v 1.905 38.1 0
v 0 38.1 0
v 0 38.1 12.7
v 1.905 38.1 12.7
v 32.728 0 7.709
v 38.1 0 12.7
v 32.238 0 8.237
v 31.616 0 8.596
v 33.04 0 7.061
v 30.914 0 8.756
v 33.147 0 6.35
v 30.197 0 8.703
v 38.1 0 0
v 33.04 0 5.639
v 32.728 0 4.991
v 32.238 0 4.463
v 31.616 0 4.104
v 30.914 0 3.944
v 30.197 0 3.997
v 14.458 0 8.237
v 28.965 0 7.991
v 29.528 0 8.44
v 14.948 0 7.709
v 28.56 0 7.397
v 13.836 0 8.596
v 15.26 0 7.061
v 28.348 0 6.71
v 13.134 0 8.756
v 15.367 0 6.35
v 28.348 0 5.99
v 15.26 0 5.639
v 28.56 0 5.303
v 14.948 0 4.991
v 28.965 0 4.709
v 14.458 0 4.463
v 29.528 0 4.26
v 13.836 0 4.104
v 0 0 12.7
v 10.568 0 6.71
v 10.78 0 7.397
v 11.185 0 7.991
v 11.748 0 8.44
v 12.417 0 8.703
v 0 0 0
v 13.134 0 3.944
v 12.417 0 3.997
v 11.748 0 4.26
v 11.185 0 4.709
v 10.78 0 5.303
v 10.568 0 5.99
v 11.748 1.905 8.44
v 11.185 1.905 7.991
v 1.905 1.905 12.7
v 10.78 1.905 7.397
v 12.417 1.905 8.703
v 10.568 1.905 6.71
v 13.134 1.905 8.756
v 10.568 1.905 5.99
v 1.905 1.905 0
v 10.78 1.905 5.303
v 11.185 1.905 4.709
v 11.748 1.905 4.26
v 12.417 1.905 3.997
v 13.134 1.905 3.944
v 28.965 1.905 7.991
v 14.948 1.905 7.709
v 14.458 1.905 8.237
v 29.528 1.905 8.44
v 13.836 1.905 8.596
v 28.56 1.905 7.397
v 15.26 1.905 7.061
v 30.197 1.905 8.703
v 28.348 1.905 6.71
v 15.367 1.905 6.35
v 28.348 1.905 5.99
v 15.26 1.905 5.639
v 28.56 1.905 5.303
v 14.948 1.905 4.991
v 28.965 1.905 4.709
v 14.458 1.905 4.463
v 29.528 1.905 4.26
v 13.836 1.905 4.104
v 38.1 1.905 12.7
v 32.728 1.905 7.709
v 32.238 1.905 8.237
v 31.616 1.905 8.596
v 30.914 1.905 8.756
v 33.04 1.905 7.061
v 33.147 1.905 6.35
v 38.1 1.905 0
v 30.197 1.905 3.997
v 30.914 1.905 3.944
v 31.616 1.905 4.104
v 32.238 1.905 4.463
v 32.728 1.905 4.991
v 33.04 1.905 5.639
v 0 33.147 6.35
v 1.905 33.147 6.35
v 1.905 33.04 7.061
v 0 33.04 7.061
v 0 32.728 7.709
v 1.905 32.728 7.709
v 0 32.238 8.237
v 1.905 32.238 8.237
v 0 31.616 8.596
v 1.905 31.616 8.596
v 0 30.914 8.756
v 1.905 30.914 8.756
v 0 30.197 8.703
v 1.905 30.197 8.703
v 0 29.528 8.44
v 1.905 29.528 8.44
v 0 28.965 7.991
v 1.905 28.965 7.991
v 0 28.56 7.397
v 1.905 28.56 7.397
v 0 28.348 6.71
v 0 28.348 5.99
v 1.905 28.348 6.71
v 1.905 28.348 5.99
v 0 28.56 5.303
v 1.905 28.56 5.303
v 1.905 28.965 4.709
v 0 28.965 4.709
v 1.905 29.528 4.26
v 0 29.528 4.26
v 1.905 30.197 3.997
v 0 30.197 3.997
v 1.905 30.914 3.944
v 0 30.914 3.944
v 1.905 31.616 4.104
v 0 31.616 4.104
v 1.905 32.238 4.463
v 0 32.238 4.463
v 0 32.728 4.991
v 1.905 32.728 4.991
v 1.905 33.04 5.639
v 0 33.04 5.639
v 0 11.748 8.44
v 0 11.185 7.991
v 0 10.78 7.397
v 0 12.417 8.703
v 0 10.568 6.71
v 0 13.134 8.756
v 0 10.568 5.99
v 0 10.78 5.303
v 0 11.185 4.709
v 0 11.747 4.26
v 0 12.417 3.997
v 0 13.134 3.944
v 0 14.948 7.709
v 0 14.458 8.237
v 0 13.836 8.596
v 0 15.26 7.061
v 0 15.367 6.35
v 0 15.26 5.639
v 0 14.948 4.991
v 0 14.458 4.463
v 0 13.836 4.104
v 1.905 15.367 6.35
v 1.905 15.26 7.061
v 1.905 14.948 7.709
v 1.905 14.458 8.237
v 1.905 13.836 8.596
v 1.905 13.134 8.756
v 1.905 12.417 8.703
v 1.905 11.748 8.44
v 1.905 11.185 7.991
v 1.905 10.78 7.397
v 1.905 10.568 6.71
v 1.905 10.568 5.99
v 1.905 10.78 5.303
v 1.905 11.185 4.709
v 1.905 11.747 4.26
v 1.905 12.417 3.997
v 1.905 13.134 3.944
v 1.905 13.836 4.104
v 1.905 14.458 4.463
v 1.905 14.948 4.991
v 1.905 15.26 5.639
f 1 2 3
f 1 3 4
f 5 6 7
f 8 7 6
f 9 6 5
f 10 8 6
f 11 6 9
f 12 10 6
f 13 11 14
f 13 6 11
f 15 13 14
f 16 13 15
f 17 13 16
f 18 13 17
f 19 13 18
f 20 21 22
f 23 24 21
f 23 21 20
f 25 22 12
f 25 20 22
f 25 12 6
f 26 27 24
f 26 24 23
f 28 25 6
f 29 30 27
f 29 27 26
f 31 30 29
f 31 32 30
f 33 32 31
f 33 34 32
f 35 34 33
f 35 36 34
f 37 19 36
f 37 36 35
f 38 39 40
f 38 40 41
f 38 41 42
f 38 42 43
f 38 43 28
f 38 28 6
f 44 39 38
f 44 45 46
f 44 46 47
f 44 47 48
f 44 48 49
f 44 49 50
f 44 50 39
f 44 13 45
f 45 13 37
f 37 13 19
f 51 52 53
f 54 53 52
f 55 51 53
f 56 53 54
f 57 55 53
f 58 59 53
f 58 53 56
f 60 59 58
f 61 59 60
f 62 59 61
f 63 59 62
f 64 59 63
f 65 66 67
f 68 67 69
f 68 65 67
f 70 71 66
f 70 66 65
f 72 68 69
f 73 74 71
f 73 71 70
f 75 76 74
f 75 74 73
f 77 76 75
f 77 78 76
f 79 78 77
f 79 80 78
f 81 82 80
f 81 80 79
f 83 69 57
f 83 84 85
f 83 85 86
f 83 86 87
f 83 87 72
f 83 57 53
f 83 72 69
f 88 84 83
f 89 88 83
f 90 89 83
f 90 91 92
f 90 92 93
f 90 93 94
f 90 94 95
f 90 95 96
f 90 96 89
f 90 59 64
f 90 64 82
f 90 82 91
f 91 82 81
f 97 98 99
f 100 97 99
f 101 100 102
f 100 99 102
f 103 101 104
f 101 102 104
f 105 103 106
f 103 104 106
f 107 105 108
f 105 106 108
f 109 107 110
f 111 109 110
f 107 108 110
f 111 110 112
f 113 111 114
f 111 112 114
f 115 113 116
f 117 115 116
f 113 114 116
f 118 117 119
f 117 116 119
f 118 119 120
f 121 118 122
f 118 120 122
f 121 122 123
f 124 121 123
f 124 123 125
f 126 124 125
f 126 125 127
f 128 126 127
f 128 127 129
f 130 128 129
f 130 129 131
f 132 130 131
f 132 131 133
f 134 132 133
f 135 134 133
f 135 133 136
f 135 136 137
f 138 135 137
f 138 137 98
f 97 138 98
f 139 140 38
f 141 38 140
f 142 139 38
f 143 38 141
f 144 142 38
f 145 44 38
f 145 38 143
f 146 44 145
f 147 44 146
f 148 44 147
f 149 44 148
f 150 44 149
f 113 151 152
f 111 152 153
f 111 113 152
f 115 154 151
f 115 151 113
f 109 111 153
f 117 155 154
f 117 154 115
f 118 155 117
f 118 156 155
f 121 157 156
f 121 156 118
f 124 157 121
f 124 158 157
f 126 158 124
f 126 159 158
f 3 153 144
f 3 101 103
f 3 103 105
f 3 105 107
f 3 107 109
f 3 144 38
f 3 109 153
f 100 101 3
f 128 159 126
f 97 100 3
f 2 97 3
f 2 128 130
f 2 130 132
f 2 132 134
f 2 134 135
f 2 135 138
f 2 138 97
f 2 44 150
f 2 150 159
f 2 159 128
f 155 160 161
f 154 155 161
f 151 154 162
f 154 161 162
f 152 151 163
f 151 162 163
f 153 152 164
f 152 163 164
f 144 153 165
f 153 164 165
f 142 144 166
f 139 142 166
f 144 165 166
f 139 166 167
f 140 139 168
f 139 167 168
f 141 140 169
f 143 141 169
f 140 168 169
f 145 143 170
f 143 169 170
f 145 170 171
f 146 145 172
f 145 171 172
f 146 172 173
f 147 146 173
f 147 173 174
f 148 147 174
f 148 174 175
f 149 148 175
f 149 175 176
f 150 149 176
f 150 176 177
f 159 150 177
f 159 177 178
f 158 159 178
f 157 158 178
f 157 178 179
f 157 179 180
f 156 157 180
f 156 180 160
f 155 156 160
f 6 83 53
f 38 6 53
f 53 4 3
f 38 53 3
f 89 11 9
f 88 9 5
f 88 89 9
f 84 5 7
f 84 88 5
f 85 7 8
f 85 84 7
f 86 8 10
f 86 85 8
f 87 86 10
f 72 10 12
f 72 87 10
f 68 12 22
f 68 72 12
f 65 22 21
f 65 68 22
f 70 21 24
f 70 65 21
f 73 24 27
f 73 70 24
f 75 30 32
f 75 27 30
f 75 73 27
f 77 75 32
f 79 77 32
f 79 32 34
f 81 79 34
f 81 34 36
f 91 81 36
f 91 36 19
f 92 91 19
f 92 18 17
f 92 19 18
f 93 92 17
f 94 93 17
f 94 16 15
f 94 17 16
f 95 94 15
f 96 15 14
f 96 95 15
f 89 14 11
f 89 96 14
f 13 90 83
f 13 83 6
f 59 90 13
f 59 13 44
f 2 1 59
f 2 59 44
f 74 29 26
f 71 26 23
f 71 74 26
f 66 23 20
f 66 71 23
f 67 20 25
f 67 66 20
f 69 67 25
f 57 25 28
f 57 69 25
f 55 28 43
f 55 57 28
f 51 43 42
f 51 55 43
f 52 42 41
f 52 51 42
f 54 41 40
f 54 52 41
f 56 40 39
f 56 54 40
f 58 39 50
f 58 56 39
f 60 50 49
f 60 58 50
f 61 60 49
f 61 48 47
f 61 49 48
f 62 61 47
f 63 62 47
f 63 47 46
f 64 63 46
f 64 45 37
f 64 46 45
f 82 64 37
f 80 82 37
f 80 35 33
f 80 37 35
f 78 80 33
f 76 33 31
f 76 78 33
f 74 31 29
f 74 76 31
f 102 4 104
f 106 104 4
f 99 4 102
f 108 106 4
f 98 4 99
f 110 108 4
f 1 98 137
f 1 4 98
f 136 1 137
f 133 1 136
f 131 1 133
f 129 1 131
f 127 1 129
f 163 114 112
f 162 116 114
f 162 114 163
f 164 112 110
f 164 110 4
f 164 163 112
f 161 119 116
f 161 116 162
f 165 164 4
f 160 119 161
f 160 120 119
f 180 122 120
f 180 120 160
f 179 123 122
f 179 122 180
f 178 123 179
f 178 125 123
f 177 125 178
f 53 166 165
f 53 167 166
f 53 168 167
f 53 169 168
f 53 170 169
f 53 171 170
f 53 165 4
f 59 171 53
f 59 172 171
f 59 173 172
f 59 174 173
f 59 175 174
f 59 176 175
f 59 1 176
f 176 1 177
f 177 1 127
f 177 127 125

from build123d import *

# Parameters (mm, degrees)
BOSS_EXTRUDE1_DEPTH = 12.7
SKETCH2_R           = 2.413
CUT_EXTRUDE1_DEPTH  = 55.064572735


with BuildPart() as part:
    # Sketch1 → Boss-Extrude1 (new body)
    with BuildSketch(Plane.XY):
        Polygon((0, 0), (0, 38.1), (1.905, 38.1), (1.905, 1.905), (38.1, 1.905), (38.1, 0), align=None)
    extrude(amount=BOSS_EXTRUDE1_DEPTH)

    # Sketch2 → Cut-Extrude1 (cut, through all)
    with BuildSketch(Plane(origin=(1.905, 0, 0), x_dir=(0, 0, -1), z_dir=(1, 0, 0))):
        with Locations(Location((-6.35, 30.734, 0), (0, 0, 90))):
            Circle(SKETCH2_R)
        with Locations(Location((-6.35, 12.954, 0), (0, 0, 90))):
            Circle(SKETCH2_R)
    cut_extrude1 = extrude(amount=-CUT_EXTRUDE1_DEPTH, mode=Mode.SUBTRACT)

    # Mirror1: Cut-Extrude1 across plane
    add(cut_extrude1.mirror(Plane(origin=(0, 0, 0), x_dir=(0, 0, 1), z_dir=(-0.7071067811865471, 0.7071067811865479, 0))), mode=Mode.SUBTRACT)


solid = part.part
